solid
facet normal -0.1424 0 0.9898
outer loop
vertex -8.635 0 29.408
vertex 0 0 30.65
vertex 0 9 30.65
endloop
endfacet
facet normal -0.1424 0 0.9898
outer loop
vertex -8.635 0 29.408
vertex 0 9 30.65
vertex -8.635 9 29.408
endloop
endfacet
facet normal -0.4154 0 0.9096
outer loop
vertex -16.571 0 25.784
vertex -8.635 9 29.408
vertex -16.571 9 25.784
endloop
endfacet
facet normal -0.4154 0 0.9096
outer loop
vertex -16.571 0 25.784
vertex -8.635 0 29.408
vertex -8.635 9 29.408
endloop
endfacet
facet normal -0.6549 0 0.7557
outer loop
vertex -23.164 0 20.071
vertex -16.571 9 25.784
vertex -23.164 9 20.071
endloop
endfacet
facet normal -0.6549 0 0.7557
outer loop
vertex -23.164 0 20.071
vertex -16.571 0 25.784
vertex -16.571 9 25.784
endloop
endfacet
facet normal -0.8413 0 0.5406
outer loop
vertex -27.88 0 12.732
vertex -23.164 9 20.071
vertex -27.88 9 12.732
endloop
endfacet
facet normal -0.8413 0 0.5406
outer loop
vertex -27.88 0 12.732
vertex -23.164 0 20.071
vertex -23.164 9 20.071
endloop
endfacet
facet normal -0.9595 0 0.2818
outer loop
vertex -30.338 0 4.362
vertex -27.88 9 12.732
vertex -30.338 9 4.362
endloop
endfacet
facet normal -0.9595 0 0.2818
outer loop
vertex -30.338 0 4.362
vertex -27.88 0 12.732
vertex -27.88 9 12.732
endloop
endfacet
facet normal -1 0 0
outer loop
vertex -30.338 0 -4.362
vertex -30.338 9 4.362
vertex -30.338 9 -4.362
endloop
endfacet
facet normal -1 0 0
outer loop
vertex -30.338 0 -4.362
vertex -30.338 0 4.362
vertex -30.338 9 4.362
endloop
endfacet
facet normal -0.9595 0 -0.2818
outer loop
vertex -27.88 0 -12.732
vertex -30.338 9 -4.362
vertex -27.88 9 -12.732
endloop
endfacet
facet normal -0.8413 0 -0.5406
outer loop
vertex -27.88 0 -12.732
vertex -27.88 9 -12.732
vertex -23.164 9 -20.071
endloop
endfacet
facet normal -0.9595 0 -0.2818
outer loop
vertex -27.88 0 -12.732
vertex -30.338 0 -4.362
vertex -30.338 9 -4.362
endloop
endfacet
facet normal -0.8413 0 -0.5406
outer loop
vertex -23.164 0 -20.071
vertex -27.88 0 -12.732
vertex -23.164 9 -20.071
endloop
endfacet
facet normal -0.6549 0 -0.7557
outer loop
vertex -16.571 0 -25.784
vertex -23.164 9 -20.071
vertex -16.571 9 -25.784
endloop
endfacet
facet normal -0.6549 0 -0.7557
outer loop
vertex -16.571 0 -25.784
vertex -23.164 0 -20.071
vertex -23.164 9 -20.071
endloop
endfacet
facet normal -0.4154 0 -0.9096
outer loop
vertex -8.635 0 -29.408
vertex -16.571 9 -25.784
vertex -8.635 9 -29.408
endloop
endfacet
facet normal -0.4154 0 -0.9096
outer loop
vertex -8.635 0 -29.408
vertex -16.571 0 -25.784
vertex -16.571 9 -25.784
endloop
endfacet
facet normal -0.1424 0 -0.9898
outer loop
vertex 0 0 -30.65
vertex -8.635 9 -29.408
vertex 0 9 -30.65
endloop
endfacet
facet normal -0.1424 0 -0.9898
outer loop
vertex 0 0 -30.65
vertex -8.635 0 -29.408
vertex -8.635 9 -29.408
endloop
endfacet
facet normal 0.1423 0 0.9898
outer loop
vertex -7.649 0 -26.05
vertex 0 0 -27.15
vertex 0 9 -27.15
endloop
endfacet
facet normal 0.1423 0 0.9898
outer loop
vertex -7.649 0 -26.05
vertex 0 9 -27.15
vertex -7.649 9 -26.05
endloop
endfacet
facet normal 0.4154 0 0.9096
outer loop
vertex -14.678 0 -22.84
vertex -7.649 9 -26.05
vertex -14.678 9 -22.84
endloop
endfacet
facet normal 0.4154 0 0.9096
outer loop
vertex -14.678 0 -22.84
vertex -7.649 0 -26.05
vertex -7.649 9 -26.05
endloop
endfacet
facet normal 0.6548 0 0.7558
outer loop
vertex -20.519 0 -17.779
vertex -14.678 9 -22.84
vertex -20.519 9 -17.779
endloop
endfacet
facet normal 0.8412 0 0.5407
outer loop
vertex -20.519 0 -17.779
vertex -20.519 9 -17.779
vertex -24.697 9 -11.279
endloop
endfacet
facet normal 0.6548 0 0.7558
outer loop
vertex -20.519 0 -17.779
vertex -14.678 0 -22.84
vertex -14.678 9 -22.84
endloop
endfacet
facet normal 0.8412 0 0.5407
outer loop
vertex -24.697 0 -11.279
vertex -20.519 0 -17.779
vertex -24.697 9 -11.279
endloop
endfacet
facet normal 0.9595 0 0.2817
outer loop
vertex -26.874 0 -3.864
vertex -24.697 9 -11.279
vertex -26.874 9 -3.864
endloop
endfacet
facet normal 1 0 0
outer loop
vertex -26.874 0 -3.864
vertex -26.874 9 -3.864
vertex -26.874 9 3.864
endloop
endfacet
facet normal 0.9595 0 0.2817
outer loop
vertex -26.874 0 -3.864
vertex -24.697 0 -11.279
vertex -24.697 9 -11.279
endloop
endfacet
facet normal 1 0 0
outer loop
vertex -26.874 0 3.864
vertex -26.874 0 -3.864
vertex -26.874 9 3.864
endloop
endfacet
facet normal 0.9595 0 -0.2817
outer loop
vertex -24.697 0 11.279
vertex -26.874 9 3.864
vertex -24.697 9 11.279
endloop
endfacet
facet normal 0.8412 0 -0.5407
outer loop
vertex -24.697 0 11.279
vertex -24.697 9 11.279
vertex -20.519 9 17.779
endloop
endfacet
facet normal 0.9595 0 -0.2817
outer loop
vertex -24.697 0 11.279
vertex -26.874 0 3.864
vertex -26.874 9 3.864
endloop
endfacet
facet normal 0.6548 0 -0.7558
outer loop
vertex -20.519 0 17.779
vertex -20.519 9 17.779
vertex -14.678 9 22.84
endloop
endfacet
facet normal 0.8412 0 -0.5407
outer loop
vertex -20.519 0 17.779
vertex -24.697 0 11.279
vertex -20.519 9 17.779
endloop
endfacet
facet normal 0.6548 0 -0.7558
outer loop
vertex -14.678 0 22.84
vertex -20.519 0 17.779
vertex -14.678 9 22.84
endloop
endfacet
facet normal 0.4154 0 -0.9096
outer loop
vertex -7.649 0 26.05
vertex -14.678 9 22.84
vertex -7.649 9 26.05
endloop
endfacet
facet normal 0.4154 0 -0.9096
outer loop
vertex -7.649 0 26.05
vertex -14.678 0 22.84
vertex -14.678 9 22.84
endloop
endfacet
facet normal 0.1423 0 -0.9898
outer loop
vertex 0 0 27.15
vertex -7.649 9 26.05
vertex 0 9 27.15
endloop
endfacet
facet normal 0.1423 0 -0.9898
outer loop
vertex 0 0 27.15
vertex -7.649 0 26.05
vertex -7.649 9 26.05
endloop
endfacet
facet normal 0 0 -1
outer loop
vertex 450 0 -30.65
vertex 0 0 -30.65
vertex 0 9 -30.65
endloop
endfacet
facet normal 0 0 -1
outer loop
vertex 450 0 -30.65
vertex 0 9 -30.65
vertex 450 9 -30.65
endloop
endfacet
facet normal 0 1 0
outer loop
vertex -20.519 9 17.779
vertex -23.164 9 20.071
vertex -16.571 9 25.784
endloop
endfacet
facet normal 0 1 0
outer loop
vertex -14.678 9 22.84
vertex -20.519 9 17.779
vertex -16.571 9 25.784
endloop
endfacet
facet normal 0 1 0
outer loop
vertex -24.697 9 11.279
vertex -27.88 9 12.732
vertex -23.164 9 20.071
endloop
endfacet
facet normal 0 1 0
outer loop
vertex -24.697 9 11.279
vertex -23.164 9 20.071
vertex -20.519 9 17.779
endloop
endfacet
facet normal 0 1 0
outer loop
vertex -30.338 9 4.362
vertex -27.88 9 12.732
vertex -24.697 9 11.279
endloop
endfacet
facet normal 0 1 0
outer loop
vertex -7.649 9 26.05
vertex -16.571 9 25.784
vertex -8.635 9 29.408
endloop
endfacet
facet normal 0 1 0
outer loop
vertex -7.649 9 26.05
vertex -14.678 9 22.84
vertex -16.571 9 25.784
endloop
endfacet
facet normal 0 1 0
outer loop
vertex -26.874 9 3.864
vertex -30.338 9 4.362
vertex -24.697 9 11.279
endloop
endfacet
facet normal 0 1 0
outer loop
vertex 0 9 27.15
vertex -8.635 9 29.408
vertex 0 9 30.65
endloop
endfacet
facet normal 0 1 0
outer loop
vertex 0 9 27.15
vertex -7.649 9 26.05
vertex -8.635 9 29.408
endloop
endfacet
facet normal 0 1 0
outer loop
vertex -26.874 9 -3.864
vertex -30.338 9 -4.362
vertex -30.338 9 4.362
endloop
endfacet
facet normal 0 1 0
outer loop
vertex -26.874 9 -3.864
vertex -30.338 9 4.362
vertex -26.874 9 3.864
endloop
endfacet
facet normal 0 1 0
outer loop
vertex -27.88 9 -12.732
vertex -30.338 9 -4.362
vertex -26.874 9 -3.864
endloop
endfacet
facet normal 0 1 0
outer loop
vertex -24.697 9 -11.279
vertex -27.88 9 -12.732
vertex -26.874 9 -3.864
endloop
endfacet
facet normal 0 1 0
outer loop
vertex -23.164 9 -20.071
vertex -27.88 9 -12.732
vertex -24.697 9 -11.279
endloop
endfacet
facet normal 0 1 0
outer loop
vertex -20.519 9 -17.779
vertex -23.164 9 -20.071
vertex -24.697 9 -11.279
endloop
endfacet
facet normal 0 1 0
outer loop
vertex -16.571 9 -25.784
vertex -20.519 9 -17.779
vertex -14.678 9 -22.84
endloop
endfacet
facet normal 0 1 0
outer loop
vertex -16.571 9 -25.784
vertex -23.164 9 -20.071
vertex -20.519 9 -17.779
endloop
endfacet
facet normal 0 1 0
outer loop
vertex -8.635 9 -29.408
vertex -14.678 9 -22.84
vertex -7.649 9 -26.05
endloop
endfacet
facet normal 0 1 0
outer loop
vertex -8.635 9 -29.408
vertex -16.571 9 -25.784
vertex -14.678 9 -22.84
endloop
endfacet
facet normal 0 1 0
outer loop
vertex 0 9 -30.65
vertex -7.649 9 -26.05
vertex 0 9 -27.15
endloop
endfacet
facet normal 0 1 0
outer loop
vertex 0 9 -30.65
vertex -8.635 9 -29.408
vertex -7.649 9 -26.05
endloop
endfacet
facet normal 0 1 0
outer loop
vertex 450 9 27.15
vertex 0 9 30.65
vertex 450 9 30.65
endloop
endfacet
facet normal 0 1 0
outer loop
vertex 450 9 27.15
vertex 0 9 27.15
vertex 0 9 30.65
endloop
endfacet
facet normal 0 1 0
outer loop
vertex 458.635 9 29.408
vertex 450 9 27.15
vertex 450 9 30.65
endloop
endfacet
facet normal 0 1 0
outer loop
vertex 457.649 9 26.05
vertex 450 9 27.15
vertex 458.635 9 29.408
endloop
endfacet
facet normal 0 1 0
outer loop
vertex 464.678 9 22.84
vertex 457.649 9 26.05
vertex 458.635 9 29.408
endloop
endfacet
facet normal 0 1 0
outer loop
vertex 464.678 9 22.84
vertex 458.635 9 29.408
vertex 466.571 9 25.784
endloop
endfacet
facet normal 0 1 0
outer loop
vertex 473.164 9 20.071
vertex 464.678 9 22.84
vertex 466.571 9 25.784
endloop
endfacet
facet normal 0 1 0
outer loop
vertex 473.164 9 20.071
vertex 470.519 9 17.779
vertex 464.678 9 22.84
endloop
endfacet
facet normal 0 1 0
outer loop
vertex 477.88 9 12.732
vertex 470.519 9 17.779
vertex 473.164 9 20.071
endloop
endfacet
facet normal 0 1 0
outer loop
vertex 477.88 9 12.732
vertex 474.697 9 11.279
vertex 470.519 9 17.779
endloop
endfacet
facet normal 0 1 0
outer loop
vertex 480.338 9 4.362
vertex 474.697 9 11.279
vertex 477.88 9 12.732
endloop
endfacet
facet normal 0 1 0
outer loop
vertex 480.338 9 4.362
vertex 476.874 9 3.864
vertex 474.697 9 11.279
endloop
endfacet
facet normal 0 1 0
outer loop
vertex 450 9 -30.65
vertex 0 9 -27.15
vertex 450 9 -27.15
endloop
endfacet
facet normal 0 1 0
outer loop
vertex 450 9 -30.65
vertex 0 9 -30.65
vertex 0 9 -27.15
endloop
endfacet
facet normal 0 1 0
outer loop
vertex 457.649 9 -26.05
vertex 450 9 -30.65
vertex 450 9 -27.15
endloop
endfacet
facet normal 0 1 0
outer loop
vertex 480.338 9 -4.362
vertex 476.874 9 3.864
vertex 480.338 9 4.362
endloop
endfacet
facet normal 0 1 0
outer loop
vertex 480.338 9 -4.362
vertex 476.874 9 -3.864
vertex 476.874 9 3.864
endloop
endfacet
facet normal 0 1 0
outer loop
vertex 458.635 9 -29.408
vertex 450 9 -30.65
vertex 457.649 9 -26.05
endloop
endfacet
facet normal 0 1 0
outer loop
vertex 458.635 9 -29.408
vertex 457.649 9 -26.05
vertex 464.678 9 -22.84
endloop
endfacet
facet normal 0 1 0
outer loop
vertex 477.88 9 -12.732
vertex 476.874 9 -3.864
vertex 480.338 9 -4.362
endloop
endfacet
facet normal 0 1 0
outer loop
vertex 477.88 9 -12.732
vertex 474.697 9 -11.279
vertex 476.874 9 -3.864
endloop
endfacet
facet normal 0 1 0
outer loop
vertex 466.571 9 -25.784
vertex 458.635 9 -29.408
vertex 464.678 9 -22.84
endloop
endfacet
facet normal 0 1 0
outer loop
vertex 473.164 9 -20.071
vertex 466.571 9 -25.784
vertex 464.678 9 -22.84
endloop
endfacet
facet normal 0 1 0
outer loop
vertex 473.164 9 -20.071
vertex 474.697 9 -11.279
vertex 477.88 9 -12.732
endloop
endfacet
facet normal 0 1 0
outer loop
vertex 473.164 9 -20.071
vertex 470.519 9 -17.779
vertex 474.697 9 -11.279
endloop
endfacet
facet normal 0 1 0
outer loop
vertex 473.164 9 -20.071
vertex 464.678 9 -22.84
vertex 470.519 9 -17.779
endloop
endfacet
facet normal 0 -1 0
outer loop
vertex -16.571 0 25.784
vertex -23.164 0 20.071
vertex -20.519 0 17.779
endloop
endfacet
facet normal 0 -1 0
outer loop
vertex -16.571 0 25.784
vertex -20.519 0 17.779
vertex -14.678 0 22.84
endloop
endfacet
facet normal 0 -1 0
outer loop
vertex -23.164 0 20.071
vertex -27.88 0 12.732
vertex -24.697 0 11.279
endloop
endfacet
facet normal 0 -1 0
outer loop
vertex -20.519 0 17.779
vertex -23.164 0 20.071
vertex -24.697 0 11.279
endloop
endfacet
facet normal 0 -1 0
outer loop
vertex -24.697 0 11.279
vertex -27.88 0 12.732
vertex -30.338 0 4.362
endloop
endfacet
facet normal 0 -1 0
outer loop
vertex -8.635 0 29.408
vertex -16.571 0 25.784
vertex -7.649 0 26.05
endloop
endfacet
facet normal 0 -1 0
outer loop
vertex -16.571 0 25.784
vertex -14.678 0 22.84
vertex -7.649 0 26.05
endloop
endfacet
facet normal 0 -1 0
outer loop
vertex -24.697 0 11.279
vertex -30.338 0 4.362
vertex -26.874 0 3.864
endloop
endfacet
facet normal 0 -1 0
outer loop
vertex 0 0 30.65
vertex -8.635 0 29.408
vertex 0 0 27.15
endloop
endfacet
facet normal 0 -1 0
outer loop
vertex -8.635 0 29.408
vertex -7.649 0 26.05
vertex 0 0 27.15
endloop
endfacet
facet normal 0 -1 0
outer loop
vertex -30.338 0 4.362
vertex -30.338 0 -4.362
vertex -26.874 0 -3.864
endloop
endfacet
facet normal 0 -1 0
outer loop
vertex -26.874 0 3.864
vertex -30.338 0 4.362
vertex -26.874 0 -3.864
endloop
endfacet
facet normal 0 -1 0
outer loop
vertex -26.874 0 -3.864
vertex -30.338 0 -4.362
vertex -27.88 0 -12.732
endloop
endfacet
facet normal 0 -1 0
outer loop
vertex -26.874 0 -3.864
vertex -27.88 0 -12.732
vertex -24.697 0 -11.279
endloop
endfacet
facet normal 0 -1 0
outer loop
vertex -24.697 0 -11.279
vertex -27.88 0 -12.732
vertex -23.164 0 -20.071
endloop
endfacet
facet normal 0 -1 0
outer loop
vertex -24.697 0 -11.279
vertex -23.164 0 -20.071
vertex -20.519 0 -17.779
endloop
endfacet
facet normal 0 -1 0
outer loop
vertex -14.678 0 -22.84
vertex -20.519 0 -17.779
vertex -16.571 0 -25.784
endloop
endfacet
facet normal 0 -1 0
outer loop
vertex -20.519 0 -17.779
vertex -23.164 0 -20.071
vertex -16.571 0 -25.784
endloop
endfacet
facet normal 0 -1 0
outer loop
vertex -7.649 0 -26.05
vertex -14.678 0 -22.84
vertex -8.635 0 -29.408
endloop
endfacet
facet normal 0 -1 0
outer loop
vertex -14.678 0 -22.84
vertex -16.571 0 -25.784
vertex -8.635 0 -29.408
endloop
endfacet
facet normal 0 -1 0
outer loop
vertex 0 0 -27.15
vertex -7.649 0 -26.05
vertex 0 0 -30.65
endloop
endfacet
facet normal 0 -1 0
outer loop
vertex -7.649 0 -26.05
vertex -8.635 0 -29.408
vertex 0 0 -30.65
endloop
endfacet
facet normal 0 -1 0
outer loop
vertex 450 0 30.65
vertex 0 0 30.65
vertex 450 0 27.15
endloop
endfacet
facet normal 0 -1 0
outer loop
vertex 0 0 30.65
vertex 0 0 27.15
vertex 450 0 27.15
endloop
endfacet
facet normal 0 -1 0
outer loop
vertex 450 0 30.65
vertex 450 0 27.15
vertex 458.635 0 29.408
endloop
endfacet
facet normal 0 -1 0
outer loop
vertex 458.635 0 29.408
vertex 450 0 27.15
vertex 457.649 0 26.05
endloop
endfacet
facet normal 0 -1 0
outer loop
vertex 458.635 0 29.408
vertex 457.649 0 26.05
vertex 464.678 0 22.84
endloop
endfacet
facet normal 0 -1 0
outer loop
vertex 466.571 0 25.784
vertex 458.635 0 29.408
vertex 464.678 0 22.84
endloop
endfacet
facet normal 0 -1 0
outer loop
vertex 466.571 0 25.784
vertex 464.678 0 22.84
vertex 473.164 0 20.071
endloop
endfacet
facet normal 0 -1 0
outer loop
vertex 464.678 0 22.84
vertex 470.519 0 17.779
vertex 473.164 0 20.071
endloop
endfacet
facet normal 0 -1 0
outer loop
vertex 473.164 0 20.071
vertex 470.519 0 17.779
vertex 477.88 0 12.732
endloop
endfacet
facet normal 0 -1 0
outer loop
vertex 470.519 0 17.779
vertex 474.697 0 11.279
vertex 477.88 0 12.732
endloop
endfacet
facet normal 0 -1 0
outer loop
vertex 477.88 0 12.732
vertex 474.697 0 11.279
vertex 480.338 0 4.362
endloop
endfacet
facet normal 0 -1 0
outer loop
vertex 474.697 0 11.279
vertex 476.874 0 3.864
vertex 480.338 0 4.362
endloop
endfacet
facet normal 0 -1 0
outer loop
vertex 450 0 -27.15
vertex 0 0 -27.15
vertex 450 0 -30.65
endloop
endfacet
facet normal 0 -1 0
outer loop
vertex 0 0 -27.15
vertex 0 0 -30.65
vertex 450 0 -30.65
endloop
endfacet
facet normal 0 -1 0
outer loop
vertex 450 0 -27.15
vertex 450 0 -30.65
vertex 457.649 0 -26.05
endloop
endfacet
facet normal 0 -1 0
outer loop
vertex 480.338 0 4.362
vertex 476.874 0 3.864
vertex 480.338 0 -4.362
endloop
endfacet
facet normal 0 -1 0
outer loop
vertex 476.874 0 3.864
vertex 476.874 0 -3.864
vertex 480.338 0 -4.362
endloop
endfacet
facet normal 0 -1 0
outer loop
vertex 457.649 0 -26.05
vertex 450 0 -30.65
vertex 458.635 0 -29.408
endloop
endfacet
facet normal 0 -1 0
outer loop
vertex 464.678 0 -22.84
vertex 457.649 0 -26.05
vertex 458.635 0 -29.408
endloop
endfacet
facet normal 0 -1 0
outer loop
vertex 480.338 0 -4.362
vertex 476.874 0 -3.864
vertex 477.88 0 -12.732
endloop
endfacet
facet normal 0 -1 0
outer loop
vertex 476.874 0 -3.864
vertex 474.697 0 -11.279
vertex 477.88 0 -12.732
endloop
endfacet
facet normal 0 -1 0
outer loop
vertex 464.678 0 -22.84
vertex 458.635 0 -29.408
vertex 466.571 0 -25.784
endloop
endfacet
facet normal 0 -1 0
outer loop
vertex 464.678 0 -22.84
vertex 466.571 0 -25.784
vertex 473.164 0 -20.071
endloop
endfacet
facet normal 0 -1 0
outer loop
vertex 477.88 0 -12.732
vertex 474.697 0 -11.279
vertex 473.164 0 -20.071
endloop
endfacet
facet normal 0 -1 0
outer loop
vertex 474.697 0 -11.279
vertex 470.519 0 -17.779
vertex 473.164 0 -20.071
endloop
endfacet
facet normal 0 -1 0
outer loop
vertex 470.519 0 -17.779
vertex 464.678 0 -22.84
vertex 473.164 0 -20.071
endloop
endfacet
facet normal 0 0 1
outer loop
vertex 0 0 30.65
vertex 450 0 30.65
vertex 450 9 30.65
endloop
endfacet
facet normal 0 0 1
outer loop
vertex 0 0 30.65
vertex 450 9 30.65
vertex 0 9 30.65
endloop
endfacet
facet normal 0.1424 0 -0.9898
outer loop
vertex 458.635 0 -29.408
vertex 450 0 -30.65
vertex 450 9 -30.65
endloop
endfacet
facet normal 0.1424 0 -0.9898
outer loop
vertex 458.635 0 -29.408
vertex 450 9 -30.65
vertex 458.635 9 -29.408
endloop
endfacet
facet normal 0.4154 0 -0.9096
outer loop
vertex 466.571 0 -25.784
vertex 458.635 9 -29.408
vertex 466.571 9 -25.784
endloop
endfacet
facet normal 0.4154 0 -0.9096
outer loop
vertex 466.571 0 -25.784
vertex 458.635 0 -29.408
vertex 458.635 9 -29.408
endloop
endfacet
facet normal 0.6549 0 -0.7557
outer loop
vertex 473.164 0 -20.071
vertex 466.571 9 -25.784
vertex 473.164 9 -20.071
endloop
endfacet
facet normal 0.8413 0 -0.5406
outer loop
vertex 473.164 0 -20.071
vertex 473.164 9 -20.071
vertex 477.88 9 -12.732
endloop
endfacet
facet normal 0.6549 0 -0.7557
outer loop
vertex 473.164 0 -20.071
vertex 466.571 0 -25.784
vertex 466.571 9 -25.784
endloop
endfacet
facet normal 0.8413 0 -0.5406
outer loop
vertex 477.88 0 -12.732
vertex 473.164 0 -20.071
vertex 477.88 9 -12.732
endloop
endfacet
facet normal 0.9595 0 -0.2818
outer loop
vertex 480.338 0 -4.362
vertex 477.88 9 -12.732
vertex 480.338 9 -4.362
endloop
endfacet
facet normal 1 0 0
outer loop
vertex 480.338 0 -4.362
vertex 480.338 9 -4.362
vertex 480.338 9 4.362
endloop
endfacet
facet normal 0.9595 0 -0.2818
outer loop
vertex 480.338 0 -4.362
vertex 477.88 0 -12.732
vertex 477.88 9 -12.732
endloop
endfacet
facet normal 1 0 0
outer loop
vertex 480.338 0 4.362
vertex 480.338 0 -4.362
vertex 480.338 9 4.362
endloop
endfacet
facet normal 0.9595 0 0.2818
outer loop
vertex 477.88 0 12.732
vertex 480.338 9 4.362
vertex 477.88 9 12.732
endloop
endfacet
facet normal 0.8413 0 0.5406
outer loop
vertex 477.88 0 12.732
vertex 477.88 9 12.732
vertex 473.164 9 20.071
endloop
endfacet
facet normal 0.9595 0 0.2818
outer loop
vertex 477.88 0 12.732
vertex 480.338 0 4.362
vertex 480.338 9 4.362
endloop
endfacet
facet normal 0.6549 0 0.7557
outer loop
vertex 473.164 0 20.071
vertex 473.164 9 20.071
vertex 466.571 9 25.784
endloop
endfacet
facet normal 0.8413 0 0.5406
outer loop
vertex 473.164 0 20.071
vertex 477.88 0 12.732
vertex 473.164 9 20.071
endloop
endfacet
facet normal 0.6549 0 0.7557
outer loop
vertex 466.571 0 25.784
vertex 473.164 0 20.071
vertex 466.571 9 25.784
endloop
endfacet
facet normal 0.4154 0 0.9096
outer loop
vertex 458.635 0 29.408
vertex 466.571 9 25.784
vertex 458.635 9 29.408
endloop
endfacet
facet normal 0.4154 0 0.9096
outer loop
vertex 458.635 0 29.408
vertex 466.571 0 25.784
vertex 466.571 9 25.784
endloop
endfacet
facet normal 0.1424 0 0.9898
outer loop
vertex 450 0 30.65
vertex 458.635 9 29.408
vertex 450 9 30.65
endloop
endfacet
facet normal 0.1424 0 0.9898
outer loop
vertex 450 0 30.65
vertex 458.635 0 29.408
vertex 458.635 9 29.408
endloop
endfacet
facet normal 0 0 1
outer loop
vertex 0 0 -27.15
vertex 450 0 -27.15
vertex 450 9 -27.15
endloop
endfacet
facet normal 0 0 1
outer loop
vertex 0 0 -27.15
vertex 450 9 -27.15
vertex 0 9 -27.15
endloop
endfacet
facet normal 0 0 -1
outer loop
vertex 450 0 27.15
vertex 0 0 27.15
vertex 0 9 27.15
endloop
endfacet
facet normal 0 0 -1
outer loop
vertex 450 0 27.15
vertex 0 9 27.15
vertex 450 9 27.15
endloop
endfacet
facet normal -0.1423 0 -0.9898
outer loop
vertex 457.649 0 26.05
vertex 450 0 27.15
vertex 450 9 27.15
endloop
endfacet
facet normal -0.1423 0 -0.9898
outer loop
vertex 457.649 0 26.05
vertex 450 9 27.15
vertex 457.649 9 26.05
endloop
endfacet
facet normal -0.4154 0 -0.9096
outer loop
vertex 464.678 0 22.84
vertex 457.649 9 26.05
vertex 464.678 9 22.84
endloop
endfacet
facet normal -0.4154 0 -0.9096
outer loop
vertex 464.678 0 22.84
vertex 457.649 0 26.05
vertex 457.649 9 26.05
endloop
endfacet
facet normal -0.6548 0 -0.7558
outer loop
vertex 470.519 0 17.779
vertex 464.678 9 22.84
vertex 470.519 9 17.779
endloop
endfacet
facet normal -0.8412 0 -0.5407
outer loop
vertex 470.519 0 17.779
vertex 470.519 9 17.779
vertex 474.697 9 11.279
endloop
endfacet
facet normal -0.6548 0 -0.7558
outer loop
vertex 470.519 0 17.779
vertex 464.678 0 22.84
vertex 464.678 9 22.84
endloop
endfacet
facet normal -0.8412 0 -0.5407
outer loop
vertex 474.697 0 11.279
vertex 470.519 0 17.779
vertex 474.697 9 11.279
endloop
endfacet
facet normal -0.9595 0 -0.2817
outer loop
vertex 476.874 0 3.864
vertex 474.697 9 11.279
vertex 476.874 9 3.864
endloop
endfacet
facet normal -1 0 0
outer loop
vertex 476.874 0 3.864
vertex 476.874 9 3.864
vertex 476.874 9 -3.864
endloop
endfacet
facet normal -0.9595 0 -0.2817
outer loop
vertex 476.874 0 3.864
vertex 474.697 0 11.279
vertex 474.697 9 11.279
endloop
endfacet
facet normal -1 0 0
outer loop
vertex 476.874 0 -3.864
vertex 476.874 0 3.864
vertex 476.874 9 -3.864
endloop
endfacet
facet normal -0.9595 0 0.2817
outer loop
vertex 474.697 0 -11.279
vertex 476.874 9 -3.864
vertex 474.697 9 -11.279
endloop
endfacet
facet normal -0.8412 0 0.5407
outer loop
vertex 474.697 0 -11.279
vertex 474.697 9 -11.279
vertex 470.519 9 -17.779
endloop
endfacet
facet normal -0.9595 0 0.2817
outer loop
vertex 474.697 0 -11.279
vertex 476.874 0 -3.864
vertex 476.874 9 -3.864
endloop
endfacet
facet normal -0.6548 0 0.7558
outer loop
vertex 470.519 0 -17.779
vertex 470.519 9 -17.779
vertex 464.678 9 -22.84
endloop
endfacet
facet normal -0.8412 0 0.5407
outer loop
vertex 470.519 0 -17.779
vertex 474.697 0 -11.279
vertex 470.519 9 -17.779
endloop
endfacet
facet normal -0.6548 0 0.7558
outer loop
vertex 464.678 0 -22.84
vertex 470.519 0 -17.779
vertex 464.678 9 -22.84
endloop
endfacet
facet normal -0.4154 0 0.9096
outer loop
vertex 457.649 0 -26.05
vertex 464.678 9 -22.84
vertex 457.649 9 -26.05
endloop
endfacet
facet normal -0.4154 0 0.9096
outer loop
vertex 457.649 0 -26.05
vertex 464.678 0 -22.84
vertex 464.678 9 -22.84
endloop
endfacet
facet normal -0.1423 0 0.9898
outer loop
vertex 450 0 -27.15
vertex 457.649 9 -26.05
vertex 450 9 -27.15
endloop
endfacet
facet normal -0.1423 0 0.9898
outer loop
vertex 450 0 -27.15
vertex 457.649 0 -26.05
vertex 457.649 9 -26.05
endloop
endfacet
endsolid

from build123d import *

# Parameters (mm, degrees)
BOSS_EXTRUDE1_DEPTH = 9


with BuildPart() as part:
    # Sketch1 → Boss-Extrude1 (new body)
    # profile 1 of 2: a face of its own
    with BuildSketch(Plane(origin=(0, 0, 0), x_dir=(1, 0, 0), z_dir=(0, 1, 0))):
        with BuildLine():
            Line((0, 30.65), (450, 30.65))
            ThreePointArc((450, 30.65), (480.65, 0), (450, -30.65))
            Line((450, -30.65), (0, -30.65))
            ThreePointArc((0, -30.65), (-30.65, 0), (0, 30.65))
        make_face()
        with BuildLine():
            ThreePointArc((450, -28.65), (478.65, 0), (450, 28.65))
            Line((450, 28.65), (0, 28.65))
            ThreePointArc((0, 28.65), (-28.65, 0), (0, -28.65))
            Line((0, -28.65), (450, -28.65))
        make_face(mode=Mode.SUBTRACT)
    # profile 2 of 2: a face of its own
    with BuildSketch(Plane(origin=(0, 0, 0), x_dir=(1, 0, 0), z_dir=(0, 1, 0))):
        with BuildLine():
            Line((0, -28.65), (450, -28.65))
            ThreePointArc((450, -28.65), (478.65, 0), (450, 28.65))
            Line((450, 28.65), (0, 28.65))
            ThreePointArc((0, 28.65), (-28.65, 0), (0, -28.65))
        make_face()
        with BuildLine():
            ThreePointArc((0, 27.15), (-27.15, 0), (0, -27.15))
            Line((0, -27.15), (450, -27.15))
            ThreePointArc((450, -27.15), (477.15, 0), (450, 27.15))
            Line((450, 27.15), (0, 27.15))
        make_face(mode=Mode.SUBTRACT)
    extrude(amount=BOSS_EXTRUDE1_DEPTH)


solid = part.part
